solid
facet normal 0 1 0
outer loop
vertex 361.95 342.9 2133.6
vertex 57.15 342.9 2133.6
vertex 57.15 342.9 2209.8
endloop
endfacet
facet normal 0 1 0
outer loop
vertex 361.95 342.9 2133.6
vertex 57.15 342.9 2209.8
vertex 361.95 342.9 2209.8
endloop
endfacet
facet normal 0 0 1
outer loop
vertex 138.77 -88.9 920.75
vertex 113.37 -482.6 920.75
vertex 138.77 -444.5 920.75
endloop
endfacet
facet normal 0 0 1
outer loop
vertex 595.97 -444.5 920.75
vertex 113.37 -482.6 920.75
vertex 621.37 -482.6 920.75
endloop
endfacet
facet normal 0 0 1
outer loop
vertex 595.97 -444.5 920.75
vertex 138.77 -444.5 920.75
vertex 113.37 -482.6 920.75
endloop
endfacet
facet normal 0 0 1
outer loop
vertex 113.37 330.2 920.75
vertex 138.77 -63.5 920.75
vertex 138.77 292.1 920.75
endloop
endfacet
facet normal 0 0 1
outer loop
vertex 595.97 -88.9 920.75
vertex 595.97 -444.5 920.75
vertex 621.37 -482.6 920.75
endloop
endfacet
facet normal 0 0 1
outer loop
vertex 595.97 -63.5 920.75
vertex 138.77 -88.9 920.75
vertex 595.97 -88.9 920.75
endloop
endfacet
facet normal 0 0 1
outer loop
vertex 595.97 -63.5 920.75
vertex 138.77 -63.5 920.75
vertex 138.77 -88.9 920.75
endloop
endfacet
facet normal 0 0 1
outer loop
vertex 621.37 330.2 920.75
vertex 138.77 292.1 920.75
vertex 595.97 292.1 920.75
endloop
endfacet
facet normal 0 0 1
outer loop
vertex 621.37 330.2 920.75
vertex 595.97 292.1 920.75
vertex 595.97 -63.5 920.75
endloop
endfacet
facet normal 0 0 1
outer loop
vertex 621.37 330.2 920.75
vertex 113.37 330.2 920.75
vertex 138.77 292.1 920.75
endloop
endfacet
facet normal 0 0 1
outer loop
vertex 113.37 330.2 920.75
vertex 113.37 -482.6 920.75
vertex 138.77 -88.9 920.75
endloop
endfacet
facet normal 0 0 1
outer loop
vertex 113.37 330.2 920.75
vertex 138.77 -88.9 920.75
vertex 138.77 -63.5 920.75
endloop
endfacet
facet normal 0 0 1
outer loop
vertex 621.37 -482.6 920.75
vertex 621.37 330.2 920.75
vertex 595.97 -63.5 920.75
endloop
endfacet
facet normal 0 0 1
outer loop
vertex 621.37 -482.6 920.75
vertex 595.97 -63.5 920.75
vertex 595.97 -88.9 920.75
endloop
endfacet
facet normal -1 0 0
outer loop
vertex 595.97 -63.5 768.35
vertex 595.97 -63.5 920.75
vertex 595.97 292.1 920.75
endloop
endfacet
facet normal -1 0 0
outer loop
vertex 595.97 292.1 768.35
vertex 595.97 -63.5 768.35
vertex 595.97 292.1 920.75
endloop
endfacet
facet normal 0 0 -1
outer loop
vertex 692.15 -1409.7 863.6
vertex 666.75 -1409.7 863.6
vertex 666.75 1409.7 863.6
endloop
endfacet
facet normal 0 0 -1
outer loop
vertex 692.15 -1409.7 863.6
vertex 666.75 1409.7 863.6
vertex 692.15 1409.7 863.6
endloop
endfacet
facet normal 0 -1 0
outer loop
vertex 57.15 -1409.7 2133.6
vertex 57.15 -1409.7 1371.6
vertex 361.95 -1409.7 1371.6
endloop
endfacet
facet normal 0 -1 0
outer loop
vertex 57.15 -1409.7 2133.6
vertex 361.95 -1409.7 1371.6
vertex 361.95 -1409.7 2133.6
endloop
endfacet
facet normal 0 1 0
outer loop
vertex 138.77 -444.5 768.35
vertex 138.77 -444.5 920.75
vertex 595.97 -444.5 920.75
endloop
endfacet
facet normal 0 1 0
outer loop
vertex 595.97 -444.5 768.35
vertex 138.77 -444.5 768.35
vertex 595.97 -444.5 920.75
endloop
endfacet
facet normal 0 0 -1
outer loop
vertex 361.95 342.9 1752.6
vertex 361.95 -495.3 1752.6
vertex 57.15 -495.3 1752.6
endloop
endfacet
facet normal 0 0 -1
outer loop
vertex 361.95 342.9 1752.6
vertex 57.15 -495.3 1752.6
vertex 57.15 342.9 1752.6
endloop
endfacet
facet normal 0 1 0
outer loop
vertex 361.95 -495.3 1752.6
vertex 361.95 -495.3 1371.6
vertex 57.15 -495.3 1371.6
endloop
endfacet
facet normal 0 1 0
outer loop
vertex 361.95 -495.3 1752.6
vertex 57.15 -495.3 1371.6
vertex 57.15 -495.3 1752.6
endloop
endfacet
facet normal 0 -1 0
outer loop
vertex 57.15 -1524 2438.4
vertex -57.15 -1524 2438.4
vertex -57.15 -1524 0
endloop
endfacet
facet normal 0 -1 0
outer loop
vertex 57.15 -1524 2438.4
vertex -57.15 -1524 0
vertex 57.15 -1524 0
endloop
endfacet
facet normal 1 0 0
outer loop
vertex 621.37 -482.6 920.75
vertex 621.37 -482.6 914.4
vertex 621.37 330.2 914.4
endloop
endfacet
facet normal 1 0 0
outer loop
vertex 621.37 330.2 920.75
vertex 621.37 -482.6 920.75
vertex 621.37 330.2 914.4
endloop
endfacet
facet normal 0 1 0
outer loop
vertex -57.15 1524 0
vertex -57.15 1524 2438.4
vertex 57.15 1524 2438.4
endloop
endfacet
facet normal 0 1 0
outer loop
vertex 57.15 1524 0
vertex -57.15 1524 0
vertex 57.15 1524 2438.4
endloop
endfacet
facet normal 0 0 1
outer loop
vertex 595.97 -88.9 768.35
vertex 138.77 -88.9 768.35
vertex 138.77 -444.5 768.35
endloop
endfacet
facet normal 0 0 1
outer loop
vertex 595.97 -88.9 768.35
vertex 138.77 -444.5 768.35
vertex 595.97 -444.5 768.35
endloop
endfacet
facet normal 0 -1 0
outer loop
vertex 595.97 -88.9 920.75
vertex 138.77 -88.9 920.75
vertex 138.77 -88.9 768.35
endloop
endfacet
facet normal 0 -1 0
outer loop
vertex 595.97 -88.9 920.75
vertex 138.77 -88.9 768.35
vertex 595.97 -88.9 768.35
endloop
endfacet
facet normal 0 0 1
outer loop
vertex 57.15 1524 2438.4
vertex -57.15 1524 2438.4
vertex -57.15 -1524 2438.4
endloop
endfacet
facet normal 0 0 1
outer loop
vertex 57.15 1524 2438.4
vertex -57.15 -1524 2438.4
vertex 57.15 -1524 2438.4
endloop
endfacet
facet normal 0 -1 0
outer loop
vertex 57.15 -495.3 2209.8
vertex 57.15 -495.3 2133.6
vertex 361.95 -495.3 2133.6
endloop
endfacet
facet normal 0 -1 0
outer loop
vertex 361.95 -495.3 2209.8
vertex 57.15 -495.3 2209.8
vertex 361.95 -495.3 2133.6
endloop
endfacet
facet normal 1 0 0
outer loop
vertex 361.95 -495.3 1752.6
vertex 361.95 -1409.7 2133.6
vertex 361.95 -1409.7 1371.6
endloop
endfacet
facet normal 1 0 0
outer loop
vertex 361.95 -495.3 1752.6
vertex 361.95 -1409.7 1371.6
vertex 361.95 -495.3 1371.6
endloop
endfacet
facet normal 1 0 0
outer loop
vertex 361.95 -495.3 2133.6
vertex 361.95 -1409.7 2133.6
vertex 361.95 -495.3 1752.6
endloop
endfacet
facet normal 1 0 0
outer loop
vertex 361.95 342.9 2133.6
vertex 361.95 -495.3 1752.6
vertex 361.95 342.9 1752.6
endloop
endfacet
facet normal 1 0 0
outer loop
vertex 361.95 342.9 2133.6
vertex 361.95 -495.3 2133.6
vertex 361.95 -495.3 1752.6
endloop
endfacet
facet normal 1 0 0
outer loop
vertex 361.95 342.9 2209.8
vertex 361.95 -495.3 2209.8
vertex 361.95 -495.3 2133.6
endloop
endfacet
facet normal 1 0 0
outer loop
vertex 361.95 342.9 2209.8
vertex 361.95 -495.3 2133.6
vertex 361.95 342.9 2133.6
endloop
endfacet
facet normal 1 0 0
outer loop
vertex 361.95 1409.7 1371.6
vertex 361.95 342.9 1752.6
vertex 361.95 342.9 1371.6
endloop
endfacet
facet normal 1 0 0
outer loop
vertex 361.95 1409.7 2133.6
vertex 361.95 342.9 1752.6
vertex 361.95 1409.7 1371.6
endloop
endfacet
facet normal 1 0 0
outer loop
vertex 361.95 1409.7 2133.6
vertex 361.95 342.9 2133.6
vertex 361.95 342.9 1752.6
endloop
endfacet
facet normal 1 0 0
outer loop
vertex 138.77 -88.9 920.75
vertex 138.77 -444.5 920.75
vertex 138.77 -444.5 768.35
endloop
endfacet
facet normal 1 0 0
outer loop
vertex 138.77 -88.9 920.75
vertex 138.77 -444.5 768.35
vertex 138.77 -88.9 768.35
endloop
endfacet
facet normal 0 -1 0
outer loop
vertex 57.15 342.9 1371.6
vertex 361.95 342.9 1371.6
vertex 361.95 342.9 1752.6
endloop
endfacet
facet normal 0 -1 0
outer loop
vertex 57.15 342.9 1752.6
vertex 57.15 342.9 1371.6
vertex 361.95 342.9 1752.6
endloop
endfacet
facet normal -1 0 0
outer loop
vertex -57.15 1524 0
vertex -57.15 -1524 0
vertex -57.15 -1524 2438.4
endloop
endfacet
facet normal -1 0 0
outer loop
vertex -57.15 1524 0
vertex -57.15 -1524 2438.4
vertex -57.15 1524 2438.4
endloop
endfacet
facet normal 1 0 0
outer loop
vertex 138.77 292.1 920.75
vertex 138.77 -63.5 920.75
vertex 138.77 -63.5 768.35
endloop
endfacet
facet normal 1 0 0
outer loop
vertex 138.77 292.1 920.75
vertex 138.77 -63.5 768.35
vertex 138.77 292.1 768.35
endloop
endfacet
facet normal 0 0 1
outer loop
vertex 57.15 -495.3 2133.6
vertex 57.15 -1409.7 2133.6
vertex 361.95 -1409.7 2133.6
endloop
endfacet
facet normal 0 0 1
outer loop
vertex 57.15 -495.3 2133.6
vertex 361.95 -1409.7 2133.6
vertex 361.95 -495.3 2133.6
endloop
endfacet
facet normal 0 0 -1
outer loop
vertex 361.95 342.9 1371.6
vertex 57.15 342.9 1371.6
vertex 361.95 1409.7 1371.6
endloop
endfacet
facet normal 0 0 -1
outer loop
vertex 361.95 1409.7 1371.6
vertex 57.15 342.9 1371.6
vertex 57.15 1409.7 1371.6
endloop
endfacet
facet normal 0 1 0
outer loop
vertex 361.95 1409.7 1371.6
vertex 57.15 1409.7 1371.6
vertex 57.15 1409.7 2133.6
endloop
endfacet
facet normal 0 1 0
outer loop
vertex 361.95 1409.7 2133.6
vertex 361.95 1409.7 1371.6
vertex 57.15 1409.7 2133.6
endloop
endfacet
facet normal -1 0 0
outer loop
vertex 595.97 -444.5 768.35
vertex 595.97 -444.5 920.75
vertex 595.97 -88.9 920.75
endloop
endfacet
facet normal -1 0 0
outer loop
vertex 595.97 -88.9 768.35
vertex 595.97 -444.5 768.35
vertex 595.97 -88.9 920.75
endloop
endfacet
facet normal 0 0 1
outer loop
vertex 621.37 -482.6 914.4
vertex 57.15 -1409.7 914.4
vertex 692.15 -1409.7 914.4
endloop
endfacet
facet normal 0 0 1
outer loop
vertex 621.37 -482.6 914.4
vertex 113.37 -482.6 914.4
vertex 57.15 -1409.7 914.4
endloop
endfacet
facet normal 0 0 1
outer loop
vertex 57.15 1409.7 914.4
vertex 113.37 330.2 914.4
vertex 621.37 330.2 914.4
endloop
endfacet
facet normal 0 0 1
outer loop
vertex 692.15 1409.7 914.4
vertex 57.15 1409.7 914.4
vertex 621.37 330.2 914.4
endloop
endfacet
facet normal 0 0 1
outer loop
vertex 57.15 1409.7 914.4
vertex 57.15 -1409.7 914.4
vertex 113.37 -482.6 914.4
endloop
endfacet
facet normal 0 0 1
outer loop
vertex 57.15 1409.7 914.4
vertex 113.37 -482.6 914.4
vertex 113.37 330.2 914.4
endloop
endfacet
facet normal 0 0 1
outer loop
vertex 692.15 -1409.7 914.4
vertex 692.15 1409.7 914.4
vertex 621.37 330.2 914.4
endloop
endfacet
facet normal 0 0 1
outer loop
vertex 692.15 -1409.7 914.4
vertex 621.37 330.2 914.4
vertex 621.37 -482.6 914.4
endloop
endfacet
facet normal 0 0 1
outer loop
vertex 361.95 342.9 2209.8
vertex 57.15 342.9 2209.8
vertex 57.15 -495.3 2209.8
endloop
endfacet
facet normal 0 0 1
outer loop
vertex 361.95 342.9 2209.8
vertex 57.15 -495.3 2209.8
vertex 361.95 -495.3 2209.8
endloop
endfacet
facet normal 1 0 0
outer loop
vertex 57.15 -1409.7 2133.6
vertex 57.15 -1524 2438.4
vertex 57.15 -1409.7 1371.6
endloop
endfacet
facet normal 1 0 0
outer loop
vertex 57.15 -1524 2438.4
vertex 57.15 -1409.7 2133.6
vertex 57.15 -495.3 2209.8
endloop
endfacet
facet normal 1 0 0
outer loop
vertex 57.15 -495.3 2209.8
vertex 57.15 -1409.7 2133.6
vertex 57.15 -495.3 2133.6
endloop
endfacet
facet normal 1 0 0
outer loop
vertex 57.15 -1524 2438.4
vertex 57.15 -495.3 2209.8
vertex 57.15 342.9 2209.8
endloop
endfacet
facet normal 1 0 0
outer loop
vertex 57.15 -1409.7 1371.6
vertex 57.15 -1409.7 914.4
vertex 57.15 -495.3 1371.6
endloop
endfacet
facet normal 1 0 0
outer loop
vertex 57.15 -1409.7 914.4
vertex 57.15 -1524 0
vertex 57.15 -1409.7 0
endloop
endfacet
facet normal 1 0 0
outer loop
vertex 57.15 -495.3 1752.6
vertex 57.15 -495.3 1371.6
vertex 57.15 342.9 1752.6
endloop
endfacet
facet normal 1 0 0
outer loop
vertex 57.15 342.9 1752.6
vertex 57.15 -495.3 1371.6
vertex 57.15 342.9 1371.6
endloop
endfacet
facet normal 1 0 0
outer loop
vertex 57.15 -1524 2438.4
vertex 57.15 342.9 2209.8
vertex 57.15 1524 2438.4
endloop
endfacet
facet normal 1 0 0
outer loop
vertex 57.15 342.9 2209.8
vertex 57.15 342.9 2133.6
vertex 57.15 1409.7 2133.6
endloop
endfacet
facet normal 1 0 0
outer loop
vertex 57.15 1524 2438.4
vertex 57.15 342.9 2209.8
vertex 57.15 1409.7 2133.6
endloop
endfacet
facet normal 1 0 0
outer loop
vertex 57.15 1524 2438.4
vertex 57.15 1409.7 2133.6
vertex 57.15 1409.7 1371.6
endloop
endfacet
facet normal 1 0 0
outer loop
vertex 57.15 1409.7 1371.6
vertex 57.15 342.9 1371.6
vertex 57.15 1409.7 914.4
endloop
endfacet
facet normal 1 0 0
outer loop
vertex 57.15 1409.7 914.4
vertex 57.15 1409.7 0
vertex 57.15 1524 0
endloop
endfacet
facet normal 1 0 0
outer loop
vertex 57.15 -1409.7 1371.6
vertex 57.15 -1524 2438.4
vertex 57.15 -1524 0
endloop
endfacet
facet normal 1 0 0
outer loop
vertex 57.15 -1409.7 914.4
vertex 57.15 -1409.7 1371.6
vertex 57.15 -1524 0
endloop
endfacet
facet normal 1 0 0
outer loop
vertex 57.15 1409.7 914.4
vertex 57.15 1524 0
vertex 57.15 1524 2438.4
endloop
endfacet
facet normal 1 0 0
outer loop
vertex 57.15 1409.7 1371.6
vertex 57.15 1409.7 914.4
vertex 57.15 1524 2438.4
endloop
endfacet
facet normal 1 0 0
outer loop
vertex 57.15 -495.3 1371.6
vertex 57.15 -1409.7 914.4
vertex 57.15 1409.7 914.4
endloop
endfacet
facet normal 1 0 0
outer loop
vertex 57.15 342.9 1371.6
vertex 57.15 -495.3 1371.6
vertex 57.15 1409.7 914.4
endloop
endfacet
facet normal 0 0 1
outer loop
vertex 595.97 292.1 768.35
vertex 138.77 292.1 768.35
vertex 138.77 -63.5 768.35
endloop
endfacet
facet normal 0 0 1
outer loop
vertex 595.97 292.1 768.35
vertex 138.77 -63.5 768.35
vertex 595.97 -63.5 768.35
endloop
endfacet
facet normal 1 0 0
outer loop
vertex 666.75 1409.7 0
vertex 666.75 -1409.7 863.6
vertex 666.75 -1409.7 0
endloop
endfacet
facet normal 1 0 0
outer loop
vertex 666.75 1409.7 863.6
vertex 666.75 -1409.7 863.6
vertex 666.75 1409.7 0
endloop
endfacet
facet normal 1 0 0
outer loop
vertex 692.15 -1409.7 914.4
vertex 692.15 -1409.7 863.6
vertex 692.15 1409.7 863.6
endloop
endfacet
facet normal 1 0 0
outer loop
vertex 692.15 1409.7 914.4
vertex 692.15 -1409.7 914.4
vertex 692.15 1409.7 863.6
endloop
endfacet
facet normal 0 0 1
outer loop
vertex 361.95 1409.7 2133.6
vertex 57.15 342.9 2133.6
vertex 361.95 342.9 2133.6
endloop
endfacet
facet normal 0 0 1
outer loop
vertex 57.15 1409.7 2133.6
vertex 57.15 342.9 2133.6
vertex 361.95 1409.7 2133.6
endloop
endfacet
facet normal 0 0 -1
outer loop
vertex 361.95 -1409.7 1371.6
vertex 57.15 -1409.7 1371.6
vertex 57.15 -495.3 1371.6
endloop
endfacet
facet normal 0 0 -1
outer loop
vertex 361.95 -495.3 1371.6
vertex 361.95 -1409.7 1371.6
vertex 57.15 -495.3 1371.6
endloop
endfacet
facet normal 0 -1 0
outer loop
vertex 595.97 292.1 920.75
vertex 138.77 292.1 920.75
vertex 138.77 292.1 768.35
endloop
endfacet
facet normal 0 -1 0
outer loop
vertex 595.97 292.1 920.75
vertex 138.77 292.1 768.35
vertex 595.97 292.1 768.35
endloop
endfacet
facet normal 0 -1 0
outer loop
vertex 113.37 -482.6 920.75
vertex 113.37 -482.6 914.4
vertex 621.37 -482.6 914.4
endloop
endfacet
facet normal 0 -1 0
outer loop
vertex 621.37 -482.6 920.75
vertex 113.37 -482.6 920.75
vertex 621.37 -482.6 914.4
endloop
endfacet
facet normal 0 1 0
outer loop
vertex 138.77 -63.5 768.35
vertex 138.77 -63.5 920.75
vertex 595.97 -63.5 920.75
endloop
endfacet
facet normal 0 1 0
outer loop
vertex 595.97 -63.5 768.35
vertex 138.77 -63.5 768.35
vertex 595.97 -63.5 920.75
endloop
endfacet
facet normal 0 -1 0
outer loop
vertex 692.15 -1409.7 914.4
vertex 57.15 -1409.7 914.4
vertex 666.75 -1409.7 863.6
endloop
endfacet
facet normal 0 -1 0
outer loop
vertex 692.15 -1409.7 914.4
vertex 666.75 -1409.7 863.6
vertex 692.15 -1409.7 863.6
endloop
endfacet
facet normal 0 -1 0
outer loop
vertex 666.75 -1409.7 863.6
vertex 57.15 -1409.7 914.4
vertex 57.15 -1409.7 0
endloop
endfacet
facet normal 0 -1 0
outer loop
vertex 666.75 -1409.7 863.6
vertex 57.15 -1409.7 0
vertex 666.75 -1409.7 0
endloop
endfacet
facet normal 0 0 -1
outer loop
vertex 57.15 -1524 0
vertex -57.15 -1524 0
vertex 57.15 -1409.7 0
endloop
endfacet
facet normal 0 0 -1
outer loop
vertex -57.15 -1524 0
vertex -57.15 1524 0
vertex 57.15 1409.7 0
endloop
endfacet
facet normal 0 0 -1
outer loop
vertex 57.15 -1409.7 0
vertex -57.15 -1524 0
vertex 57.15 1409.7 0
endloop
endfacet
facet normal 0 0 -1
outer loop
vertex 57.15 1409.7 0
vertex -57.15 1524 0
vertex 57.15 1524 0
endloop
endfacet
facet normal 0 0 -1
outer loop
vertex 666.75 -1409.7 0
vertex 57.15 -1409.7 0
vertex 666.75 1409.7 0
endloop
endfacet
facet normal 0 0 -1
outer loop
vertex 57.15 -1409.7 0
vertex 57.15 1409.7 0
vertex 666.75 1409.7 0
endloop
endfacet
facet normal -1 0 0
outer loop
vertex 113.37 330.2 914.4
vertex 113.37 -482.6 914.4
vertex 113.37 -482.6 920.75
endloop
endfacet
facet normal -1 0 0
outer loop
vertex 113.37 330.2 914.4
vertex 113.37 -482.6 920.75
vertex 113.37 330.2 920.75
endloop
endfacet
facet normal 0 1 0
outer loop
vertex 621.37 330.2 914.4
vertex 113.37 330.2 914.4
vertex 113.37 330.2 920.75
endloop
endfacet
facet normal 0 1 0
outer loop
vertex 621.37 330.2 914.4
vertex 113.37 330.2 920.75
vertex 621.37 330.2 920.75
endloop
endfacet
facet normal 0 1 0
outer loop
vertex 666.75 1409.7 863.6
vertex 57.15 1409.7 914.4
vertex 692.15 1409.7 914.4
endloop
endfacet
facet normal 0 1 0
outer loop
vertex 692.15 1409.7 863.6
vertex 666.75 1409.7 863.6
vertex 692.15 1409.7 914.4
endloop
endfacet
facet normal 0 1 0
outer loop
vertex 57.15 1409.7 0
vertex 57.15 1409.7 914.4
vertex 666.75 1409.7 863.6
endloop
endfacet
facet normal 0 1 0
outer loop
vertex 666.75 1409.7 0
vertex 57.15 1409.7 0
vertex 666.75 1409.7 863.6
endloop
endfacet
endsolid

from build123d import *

# Parameters (mm, degrees)
F0_W      = 114.3
F0_H      = 3048
F1_DEPTH  = 2438.4
F2_W      = 2819.4
F2_H      = 863.6
F3_DEPTH  = 609.6
F4_W      = 2819.4
F4_H      = 762
F5_DEPTH  = 304.8
F6_W      = 838.2
F6_H      = 381
F7_DEPTH  = 304.8
F8_W      = 304.8
F8_H      = 838.2
F9_DEPTH  = 76.2
F10_W     = 635
F10_H     = 2819.4
F11_DEPTH = 50.8
F12_W     = 508
F12_H     = 812.8
F13_DEPTH = 6.35
F14_W     = 457.2
F14_H     = 355.6
F15_DEPTH = 152.4


with BuildPart() as f1:
    # F0 (on Top) → F1 (new body)
    with BuildSketch(Plane.XY):
        Rectangle(F0_W, F0_H)
    extrude(amount=F1_DEPTH)

    # F2 (on face) → F3 (join)
    with BuildSketch(Plane.YZ.offset(57.15)):
        with Locations((0, 431.8)):
            Rectangle(F2_W, F2_H)
    extrude(amount=F3_DEPTH)

    # F4 (on face) → F5 (join)
    with BuildSketch(Plane.YZ.offset(57.15)):
        with Locations((0, 1752.6)):
            Rectangle(F4_W, F4_H)
    extrude(amount=F5_DEPTH)

    # F6 (on face) → F7 (cut)
    with BuildSketch(Plane.YZ.offset(361.95)):
        with Locations((-76.2, 1562.1)):
            Rectangle(F6_W, F6_H)
    extrude(amount=-F7_DEPTH, mode=Mode.SUBTRACT)

    # F8 (on face) → F9 (join)
    with BuildSketch(Plane.XY.offset(2133.6)):
        with Locations((209.55, -76.2)):
            Rectangle(F8_W, F8_H)
    extrude(amount=F9_DEPTH)

    # F10 (on face) → F11 (join)
    with BuildSketch(Plane.XY.offset(863.6)):
        with Locations((374.65, 0)):
            Rectangle(F10_W, F10_H)
    extrude(amount=F11_DEPTH)

    # F12 (on face) → F13 (join)
    with BuildSketch(Plane.XY.offset(914.4)):
        with Locations((367.370255, -76.2)):
            Rectangle(F12_W, F12_H)
    extrude(amount=F13_DEPTH)

    # F14 (on face) → F15 (cut)
    with BuildSketch(Plane.XY.offset(920.75)):
        with Locations((367.370255, -266.7)):
            Rectangle(F14_W, F14_H)
        with Locations((367.370255, 114.3)):
            Rectangle(F14_W, F14_H)
    extrude(amount=-F15_DEPTH, mode=Mode.SUBTRACT)


solid = f1.part
